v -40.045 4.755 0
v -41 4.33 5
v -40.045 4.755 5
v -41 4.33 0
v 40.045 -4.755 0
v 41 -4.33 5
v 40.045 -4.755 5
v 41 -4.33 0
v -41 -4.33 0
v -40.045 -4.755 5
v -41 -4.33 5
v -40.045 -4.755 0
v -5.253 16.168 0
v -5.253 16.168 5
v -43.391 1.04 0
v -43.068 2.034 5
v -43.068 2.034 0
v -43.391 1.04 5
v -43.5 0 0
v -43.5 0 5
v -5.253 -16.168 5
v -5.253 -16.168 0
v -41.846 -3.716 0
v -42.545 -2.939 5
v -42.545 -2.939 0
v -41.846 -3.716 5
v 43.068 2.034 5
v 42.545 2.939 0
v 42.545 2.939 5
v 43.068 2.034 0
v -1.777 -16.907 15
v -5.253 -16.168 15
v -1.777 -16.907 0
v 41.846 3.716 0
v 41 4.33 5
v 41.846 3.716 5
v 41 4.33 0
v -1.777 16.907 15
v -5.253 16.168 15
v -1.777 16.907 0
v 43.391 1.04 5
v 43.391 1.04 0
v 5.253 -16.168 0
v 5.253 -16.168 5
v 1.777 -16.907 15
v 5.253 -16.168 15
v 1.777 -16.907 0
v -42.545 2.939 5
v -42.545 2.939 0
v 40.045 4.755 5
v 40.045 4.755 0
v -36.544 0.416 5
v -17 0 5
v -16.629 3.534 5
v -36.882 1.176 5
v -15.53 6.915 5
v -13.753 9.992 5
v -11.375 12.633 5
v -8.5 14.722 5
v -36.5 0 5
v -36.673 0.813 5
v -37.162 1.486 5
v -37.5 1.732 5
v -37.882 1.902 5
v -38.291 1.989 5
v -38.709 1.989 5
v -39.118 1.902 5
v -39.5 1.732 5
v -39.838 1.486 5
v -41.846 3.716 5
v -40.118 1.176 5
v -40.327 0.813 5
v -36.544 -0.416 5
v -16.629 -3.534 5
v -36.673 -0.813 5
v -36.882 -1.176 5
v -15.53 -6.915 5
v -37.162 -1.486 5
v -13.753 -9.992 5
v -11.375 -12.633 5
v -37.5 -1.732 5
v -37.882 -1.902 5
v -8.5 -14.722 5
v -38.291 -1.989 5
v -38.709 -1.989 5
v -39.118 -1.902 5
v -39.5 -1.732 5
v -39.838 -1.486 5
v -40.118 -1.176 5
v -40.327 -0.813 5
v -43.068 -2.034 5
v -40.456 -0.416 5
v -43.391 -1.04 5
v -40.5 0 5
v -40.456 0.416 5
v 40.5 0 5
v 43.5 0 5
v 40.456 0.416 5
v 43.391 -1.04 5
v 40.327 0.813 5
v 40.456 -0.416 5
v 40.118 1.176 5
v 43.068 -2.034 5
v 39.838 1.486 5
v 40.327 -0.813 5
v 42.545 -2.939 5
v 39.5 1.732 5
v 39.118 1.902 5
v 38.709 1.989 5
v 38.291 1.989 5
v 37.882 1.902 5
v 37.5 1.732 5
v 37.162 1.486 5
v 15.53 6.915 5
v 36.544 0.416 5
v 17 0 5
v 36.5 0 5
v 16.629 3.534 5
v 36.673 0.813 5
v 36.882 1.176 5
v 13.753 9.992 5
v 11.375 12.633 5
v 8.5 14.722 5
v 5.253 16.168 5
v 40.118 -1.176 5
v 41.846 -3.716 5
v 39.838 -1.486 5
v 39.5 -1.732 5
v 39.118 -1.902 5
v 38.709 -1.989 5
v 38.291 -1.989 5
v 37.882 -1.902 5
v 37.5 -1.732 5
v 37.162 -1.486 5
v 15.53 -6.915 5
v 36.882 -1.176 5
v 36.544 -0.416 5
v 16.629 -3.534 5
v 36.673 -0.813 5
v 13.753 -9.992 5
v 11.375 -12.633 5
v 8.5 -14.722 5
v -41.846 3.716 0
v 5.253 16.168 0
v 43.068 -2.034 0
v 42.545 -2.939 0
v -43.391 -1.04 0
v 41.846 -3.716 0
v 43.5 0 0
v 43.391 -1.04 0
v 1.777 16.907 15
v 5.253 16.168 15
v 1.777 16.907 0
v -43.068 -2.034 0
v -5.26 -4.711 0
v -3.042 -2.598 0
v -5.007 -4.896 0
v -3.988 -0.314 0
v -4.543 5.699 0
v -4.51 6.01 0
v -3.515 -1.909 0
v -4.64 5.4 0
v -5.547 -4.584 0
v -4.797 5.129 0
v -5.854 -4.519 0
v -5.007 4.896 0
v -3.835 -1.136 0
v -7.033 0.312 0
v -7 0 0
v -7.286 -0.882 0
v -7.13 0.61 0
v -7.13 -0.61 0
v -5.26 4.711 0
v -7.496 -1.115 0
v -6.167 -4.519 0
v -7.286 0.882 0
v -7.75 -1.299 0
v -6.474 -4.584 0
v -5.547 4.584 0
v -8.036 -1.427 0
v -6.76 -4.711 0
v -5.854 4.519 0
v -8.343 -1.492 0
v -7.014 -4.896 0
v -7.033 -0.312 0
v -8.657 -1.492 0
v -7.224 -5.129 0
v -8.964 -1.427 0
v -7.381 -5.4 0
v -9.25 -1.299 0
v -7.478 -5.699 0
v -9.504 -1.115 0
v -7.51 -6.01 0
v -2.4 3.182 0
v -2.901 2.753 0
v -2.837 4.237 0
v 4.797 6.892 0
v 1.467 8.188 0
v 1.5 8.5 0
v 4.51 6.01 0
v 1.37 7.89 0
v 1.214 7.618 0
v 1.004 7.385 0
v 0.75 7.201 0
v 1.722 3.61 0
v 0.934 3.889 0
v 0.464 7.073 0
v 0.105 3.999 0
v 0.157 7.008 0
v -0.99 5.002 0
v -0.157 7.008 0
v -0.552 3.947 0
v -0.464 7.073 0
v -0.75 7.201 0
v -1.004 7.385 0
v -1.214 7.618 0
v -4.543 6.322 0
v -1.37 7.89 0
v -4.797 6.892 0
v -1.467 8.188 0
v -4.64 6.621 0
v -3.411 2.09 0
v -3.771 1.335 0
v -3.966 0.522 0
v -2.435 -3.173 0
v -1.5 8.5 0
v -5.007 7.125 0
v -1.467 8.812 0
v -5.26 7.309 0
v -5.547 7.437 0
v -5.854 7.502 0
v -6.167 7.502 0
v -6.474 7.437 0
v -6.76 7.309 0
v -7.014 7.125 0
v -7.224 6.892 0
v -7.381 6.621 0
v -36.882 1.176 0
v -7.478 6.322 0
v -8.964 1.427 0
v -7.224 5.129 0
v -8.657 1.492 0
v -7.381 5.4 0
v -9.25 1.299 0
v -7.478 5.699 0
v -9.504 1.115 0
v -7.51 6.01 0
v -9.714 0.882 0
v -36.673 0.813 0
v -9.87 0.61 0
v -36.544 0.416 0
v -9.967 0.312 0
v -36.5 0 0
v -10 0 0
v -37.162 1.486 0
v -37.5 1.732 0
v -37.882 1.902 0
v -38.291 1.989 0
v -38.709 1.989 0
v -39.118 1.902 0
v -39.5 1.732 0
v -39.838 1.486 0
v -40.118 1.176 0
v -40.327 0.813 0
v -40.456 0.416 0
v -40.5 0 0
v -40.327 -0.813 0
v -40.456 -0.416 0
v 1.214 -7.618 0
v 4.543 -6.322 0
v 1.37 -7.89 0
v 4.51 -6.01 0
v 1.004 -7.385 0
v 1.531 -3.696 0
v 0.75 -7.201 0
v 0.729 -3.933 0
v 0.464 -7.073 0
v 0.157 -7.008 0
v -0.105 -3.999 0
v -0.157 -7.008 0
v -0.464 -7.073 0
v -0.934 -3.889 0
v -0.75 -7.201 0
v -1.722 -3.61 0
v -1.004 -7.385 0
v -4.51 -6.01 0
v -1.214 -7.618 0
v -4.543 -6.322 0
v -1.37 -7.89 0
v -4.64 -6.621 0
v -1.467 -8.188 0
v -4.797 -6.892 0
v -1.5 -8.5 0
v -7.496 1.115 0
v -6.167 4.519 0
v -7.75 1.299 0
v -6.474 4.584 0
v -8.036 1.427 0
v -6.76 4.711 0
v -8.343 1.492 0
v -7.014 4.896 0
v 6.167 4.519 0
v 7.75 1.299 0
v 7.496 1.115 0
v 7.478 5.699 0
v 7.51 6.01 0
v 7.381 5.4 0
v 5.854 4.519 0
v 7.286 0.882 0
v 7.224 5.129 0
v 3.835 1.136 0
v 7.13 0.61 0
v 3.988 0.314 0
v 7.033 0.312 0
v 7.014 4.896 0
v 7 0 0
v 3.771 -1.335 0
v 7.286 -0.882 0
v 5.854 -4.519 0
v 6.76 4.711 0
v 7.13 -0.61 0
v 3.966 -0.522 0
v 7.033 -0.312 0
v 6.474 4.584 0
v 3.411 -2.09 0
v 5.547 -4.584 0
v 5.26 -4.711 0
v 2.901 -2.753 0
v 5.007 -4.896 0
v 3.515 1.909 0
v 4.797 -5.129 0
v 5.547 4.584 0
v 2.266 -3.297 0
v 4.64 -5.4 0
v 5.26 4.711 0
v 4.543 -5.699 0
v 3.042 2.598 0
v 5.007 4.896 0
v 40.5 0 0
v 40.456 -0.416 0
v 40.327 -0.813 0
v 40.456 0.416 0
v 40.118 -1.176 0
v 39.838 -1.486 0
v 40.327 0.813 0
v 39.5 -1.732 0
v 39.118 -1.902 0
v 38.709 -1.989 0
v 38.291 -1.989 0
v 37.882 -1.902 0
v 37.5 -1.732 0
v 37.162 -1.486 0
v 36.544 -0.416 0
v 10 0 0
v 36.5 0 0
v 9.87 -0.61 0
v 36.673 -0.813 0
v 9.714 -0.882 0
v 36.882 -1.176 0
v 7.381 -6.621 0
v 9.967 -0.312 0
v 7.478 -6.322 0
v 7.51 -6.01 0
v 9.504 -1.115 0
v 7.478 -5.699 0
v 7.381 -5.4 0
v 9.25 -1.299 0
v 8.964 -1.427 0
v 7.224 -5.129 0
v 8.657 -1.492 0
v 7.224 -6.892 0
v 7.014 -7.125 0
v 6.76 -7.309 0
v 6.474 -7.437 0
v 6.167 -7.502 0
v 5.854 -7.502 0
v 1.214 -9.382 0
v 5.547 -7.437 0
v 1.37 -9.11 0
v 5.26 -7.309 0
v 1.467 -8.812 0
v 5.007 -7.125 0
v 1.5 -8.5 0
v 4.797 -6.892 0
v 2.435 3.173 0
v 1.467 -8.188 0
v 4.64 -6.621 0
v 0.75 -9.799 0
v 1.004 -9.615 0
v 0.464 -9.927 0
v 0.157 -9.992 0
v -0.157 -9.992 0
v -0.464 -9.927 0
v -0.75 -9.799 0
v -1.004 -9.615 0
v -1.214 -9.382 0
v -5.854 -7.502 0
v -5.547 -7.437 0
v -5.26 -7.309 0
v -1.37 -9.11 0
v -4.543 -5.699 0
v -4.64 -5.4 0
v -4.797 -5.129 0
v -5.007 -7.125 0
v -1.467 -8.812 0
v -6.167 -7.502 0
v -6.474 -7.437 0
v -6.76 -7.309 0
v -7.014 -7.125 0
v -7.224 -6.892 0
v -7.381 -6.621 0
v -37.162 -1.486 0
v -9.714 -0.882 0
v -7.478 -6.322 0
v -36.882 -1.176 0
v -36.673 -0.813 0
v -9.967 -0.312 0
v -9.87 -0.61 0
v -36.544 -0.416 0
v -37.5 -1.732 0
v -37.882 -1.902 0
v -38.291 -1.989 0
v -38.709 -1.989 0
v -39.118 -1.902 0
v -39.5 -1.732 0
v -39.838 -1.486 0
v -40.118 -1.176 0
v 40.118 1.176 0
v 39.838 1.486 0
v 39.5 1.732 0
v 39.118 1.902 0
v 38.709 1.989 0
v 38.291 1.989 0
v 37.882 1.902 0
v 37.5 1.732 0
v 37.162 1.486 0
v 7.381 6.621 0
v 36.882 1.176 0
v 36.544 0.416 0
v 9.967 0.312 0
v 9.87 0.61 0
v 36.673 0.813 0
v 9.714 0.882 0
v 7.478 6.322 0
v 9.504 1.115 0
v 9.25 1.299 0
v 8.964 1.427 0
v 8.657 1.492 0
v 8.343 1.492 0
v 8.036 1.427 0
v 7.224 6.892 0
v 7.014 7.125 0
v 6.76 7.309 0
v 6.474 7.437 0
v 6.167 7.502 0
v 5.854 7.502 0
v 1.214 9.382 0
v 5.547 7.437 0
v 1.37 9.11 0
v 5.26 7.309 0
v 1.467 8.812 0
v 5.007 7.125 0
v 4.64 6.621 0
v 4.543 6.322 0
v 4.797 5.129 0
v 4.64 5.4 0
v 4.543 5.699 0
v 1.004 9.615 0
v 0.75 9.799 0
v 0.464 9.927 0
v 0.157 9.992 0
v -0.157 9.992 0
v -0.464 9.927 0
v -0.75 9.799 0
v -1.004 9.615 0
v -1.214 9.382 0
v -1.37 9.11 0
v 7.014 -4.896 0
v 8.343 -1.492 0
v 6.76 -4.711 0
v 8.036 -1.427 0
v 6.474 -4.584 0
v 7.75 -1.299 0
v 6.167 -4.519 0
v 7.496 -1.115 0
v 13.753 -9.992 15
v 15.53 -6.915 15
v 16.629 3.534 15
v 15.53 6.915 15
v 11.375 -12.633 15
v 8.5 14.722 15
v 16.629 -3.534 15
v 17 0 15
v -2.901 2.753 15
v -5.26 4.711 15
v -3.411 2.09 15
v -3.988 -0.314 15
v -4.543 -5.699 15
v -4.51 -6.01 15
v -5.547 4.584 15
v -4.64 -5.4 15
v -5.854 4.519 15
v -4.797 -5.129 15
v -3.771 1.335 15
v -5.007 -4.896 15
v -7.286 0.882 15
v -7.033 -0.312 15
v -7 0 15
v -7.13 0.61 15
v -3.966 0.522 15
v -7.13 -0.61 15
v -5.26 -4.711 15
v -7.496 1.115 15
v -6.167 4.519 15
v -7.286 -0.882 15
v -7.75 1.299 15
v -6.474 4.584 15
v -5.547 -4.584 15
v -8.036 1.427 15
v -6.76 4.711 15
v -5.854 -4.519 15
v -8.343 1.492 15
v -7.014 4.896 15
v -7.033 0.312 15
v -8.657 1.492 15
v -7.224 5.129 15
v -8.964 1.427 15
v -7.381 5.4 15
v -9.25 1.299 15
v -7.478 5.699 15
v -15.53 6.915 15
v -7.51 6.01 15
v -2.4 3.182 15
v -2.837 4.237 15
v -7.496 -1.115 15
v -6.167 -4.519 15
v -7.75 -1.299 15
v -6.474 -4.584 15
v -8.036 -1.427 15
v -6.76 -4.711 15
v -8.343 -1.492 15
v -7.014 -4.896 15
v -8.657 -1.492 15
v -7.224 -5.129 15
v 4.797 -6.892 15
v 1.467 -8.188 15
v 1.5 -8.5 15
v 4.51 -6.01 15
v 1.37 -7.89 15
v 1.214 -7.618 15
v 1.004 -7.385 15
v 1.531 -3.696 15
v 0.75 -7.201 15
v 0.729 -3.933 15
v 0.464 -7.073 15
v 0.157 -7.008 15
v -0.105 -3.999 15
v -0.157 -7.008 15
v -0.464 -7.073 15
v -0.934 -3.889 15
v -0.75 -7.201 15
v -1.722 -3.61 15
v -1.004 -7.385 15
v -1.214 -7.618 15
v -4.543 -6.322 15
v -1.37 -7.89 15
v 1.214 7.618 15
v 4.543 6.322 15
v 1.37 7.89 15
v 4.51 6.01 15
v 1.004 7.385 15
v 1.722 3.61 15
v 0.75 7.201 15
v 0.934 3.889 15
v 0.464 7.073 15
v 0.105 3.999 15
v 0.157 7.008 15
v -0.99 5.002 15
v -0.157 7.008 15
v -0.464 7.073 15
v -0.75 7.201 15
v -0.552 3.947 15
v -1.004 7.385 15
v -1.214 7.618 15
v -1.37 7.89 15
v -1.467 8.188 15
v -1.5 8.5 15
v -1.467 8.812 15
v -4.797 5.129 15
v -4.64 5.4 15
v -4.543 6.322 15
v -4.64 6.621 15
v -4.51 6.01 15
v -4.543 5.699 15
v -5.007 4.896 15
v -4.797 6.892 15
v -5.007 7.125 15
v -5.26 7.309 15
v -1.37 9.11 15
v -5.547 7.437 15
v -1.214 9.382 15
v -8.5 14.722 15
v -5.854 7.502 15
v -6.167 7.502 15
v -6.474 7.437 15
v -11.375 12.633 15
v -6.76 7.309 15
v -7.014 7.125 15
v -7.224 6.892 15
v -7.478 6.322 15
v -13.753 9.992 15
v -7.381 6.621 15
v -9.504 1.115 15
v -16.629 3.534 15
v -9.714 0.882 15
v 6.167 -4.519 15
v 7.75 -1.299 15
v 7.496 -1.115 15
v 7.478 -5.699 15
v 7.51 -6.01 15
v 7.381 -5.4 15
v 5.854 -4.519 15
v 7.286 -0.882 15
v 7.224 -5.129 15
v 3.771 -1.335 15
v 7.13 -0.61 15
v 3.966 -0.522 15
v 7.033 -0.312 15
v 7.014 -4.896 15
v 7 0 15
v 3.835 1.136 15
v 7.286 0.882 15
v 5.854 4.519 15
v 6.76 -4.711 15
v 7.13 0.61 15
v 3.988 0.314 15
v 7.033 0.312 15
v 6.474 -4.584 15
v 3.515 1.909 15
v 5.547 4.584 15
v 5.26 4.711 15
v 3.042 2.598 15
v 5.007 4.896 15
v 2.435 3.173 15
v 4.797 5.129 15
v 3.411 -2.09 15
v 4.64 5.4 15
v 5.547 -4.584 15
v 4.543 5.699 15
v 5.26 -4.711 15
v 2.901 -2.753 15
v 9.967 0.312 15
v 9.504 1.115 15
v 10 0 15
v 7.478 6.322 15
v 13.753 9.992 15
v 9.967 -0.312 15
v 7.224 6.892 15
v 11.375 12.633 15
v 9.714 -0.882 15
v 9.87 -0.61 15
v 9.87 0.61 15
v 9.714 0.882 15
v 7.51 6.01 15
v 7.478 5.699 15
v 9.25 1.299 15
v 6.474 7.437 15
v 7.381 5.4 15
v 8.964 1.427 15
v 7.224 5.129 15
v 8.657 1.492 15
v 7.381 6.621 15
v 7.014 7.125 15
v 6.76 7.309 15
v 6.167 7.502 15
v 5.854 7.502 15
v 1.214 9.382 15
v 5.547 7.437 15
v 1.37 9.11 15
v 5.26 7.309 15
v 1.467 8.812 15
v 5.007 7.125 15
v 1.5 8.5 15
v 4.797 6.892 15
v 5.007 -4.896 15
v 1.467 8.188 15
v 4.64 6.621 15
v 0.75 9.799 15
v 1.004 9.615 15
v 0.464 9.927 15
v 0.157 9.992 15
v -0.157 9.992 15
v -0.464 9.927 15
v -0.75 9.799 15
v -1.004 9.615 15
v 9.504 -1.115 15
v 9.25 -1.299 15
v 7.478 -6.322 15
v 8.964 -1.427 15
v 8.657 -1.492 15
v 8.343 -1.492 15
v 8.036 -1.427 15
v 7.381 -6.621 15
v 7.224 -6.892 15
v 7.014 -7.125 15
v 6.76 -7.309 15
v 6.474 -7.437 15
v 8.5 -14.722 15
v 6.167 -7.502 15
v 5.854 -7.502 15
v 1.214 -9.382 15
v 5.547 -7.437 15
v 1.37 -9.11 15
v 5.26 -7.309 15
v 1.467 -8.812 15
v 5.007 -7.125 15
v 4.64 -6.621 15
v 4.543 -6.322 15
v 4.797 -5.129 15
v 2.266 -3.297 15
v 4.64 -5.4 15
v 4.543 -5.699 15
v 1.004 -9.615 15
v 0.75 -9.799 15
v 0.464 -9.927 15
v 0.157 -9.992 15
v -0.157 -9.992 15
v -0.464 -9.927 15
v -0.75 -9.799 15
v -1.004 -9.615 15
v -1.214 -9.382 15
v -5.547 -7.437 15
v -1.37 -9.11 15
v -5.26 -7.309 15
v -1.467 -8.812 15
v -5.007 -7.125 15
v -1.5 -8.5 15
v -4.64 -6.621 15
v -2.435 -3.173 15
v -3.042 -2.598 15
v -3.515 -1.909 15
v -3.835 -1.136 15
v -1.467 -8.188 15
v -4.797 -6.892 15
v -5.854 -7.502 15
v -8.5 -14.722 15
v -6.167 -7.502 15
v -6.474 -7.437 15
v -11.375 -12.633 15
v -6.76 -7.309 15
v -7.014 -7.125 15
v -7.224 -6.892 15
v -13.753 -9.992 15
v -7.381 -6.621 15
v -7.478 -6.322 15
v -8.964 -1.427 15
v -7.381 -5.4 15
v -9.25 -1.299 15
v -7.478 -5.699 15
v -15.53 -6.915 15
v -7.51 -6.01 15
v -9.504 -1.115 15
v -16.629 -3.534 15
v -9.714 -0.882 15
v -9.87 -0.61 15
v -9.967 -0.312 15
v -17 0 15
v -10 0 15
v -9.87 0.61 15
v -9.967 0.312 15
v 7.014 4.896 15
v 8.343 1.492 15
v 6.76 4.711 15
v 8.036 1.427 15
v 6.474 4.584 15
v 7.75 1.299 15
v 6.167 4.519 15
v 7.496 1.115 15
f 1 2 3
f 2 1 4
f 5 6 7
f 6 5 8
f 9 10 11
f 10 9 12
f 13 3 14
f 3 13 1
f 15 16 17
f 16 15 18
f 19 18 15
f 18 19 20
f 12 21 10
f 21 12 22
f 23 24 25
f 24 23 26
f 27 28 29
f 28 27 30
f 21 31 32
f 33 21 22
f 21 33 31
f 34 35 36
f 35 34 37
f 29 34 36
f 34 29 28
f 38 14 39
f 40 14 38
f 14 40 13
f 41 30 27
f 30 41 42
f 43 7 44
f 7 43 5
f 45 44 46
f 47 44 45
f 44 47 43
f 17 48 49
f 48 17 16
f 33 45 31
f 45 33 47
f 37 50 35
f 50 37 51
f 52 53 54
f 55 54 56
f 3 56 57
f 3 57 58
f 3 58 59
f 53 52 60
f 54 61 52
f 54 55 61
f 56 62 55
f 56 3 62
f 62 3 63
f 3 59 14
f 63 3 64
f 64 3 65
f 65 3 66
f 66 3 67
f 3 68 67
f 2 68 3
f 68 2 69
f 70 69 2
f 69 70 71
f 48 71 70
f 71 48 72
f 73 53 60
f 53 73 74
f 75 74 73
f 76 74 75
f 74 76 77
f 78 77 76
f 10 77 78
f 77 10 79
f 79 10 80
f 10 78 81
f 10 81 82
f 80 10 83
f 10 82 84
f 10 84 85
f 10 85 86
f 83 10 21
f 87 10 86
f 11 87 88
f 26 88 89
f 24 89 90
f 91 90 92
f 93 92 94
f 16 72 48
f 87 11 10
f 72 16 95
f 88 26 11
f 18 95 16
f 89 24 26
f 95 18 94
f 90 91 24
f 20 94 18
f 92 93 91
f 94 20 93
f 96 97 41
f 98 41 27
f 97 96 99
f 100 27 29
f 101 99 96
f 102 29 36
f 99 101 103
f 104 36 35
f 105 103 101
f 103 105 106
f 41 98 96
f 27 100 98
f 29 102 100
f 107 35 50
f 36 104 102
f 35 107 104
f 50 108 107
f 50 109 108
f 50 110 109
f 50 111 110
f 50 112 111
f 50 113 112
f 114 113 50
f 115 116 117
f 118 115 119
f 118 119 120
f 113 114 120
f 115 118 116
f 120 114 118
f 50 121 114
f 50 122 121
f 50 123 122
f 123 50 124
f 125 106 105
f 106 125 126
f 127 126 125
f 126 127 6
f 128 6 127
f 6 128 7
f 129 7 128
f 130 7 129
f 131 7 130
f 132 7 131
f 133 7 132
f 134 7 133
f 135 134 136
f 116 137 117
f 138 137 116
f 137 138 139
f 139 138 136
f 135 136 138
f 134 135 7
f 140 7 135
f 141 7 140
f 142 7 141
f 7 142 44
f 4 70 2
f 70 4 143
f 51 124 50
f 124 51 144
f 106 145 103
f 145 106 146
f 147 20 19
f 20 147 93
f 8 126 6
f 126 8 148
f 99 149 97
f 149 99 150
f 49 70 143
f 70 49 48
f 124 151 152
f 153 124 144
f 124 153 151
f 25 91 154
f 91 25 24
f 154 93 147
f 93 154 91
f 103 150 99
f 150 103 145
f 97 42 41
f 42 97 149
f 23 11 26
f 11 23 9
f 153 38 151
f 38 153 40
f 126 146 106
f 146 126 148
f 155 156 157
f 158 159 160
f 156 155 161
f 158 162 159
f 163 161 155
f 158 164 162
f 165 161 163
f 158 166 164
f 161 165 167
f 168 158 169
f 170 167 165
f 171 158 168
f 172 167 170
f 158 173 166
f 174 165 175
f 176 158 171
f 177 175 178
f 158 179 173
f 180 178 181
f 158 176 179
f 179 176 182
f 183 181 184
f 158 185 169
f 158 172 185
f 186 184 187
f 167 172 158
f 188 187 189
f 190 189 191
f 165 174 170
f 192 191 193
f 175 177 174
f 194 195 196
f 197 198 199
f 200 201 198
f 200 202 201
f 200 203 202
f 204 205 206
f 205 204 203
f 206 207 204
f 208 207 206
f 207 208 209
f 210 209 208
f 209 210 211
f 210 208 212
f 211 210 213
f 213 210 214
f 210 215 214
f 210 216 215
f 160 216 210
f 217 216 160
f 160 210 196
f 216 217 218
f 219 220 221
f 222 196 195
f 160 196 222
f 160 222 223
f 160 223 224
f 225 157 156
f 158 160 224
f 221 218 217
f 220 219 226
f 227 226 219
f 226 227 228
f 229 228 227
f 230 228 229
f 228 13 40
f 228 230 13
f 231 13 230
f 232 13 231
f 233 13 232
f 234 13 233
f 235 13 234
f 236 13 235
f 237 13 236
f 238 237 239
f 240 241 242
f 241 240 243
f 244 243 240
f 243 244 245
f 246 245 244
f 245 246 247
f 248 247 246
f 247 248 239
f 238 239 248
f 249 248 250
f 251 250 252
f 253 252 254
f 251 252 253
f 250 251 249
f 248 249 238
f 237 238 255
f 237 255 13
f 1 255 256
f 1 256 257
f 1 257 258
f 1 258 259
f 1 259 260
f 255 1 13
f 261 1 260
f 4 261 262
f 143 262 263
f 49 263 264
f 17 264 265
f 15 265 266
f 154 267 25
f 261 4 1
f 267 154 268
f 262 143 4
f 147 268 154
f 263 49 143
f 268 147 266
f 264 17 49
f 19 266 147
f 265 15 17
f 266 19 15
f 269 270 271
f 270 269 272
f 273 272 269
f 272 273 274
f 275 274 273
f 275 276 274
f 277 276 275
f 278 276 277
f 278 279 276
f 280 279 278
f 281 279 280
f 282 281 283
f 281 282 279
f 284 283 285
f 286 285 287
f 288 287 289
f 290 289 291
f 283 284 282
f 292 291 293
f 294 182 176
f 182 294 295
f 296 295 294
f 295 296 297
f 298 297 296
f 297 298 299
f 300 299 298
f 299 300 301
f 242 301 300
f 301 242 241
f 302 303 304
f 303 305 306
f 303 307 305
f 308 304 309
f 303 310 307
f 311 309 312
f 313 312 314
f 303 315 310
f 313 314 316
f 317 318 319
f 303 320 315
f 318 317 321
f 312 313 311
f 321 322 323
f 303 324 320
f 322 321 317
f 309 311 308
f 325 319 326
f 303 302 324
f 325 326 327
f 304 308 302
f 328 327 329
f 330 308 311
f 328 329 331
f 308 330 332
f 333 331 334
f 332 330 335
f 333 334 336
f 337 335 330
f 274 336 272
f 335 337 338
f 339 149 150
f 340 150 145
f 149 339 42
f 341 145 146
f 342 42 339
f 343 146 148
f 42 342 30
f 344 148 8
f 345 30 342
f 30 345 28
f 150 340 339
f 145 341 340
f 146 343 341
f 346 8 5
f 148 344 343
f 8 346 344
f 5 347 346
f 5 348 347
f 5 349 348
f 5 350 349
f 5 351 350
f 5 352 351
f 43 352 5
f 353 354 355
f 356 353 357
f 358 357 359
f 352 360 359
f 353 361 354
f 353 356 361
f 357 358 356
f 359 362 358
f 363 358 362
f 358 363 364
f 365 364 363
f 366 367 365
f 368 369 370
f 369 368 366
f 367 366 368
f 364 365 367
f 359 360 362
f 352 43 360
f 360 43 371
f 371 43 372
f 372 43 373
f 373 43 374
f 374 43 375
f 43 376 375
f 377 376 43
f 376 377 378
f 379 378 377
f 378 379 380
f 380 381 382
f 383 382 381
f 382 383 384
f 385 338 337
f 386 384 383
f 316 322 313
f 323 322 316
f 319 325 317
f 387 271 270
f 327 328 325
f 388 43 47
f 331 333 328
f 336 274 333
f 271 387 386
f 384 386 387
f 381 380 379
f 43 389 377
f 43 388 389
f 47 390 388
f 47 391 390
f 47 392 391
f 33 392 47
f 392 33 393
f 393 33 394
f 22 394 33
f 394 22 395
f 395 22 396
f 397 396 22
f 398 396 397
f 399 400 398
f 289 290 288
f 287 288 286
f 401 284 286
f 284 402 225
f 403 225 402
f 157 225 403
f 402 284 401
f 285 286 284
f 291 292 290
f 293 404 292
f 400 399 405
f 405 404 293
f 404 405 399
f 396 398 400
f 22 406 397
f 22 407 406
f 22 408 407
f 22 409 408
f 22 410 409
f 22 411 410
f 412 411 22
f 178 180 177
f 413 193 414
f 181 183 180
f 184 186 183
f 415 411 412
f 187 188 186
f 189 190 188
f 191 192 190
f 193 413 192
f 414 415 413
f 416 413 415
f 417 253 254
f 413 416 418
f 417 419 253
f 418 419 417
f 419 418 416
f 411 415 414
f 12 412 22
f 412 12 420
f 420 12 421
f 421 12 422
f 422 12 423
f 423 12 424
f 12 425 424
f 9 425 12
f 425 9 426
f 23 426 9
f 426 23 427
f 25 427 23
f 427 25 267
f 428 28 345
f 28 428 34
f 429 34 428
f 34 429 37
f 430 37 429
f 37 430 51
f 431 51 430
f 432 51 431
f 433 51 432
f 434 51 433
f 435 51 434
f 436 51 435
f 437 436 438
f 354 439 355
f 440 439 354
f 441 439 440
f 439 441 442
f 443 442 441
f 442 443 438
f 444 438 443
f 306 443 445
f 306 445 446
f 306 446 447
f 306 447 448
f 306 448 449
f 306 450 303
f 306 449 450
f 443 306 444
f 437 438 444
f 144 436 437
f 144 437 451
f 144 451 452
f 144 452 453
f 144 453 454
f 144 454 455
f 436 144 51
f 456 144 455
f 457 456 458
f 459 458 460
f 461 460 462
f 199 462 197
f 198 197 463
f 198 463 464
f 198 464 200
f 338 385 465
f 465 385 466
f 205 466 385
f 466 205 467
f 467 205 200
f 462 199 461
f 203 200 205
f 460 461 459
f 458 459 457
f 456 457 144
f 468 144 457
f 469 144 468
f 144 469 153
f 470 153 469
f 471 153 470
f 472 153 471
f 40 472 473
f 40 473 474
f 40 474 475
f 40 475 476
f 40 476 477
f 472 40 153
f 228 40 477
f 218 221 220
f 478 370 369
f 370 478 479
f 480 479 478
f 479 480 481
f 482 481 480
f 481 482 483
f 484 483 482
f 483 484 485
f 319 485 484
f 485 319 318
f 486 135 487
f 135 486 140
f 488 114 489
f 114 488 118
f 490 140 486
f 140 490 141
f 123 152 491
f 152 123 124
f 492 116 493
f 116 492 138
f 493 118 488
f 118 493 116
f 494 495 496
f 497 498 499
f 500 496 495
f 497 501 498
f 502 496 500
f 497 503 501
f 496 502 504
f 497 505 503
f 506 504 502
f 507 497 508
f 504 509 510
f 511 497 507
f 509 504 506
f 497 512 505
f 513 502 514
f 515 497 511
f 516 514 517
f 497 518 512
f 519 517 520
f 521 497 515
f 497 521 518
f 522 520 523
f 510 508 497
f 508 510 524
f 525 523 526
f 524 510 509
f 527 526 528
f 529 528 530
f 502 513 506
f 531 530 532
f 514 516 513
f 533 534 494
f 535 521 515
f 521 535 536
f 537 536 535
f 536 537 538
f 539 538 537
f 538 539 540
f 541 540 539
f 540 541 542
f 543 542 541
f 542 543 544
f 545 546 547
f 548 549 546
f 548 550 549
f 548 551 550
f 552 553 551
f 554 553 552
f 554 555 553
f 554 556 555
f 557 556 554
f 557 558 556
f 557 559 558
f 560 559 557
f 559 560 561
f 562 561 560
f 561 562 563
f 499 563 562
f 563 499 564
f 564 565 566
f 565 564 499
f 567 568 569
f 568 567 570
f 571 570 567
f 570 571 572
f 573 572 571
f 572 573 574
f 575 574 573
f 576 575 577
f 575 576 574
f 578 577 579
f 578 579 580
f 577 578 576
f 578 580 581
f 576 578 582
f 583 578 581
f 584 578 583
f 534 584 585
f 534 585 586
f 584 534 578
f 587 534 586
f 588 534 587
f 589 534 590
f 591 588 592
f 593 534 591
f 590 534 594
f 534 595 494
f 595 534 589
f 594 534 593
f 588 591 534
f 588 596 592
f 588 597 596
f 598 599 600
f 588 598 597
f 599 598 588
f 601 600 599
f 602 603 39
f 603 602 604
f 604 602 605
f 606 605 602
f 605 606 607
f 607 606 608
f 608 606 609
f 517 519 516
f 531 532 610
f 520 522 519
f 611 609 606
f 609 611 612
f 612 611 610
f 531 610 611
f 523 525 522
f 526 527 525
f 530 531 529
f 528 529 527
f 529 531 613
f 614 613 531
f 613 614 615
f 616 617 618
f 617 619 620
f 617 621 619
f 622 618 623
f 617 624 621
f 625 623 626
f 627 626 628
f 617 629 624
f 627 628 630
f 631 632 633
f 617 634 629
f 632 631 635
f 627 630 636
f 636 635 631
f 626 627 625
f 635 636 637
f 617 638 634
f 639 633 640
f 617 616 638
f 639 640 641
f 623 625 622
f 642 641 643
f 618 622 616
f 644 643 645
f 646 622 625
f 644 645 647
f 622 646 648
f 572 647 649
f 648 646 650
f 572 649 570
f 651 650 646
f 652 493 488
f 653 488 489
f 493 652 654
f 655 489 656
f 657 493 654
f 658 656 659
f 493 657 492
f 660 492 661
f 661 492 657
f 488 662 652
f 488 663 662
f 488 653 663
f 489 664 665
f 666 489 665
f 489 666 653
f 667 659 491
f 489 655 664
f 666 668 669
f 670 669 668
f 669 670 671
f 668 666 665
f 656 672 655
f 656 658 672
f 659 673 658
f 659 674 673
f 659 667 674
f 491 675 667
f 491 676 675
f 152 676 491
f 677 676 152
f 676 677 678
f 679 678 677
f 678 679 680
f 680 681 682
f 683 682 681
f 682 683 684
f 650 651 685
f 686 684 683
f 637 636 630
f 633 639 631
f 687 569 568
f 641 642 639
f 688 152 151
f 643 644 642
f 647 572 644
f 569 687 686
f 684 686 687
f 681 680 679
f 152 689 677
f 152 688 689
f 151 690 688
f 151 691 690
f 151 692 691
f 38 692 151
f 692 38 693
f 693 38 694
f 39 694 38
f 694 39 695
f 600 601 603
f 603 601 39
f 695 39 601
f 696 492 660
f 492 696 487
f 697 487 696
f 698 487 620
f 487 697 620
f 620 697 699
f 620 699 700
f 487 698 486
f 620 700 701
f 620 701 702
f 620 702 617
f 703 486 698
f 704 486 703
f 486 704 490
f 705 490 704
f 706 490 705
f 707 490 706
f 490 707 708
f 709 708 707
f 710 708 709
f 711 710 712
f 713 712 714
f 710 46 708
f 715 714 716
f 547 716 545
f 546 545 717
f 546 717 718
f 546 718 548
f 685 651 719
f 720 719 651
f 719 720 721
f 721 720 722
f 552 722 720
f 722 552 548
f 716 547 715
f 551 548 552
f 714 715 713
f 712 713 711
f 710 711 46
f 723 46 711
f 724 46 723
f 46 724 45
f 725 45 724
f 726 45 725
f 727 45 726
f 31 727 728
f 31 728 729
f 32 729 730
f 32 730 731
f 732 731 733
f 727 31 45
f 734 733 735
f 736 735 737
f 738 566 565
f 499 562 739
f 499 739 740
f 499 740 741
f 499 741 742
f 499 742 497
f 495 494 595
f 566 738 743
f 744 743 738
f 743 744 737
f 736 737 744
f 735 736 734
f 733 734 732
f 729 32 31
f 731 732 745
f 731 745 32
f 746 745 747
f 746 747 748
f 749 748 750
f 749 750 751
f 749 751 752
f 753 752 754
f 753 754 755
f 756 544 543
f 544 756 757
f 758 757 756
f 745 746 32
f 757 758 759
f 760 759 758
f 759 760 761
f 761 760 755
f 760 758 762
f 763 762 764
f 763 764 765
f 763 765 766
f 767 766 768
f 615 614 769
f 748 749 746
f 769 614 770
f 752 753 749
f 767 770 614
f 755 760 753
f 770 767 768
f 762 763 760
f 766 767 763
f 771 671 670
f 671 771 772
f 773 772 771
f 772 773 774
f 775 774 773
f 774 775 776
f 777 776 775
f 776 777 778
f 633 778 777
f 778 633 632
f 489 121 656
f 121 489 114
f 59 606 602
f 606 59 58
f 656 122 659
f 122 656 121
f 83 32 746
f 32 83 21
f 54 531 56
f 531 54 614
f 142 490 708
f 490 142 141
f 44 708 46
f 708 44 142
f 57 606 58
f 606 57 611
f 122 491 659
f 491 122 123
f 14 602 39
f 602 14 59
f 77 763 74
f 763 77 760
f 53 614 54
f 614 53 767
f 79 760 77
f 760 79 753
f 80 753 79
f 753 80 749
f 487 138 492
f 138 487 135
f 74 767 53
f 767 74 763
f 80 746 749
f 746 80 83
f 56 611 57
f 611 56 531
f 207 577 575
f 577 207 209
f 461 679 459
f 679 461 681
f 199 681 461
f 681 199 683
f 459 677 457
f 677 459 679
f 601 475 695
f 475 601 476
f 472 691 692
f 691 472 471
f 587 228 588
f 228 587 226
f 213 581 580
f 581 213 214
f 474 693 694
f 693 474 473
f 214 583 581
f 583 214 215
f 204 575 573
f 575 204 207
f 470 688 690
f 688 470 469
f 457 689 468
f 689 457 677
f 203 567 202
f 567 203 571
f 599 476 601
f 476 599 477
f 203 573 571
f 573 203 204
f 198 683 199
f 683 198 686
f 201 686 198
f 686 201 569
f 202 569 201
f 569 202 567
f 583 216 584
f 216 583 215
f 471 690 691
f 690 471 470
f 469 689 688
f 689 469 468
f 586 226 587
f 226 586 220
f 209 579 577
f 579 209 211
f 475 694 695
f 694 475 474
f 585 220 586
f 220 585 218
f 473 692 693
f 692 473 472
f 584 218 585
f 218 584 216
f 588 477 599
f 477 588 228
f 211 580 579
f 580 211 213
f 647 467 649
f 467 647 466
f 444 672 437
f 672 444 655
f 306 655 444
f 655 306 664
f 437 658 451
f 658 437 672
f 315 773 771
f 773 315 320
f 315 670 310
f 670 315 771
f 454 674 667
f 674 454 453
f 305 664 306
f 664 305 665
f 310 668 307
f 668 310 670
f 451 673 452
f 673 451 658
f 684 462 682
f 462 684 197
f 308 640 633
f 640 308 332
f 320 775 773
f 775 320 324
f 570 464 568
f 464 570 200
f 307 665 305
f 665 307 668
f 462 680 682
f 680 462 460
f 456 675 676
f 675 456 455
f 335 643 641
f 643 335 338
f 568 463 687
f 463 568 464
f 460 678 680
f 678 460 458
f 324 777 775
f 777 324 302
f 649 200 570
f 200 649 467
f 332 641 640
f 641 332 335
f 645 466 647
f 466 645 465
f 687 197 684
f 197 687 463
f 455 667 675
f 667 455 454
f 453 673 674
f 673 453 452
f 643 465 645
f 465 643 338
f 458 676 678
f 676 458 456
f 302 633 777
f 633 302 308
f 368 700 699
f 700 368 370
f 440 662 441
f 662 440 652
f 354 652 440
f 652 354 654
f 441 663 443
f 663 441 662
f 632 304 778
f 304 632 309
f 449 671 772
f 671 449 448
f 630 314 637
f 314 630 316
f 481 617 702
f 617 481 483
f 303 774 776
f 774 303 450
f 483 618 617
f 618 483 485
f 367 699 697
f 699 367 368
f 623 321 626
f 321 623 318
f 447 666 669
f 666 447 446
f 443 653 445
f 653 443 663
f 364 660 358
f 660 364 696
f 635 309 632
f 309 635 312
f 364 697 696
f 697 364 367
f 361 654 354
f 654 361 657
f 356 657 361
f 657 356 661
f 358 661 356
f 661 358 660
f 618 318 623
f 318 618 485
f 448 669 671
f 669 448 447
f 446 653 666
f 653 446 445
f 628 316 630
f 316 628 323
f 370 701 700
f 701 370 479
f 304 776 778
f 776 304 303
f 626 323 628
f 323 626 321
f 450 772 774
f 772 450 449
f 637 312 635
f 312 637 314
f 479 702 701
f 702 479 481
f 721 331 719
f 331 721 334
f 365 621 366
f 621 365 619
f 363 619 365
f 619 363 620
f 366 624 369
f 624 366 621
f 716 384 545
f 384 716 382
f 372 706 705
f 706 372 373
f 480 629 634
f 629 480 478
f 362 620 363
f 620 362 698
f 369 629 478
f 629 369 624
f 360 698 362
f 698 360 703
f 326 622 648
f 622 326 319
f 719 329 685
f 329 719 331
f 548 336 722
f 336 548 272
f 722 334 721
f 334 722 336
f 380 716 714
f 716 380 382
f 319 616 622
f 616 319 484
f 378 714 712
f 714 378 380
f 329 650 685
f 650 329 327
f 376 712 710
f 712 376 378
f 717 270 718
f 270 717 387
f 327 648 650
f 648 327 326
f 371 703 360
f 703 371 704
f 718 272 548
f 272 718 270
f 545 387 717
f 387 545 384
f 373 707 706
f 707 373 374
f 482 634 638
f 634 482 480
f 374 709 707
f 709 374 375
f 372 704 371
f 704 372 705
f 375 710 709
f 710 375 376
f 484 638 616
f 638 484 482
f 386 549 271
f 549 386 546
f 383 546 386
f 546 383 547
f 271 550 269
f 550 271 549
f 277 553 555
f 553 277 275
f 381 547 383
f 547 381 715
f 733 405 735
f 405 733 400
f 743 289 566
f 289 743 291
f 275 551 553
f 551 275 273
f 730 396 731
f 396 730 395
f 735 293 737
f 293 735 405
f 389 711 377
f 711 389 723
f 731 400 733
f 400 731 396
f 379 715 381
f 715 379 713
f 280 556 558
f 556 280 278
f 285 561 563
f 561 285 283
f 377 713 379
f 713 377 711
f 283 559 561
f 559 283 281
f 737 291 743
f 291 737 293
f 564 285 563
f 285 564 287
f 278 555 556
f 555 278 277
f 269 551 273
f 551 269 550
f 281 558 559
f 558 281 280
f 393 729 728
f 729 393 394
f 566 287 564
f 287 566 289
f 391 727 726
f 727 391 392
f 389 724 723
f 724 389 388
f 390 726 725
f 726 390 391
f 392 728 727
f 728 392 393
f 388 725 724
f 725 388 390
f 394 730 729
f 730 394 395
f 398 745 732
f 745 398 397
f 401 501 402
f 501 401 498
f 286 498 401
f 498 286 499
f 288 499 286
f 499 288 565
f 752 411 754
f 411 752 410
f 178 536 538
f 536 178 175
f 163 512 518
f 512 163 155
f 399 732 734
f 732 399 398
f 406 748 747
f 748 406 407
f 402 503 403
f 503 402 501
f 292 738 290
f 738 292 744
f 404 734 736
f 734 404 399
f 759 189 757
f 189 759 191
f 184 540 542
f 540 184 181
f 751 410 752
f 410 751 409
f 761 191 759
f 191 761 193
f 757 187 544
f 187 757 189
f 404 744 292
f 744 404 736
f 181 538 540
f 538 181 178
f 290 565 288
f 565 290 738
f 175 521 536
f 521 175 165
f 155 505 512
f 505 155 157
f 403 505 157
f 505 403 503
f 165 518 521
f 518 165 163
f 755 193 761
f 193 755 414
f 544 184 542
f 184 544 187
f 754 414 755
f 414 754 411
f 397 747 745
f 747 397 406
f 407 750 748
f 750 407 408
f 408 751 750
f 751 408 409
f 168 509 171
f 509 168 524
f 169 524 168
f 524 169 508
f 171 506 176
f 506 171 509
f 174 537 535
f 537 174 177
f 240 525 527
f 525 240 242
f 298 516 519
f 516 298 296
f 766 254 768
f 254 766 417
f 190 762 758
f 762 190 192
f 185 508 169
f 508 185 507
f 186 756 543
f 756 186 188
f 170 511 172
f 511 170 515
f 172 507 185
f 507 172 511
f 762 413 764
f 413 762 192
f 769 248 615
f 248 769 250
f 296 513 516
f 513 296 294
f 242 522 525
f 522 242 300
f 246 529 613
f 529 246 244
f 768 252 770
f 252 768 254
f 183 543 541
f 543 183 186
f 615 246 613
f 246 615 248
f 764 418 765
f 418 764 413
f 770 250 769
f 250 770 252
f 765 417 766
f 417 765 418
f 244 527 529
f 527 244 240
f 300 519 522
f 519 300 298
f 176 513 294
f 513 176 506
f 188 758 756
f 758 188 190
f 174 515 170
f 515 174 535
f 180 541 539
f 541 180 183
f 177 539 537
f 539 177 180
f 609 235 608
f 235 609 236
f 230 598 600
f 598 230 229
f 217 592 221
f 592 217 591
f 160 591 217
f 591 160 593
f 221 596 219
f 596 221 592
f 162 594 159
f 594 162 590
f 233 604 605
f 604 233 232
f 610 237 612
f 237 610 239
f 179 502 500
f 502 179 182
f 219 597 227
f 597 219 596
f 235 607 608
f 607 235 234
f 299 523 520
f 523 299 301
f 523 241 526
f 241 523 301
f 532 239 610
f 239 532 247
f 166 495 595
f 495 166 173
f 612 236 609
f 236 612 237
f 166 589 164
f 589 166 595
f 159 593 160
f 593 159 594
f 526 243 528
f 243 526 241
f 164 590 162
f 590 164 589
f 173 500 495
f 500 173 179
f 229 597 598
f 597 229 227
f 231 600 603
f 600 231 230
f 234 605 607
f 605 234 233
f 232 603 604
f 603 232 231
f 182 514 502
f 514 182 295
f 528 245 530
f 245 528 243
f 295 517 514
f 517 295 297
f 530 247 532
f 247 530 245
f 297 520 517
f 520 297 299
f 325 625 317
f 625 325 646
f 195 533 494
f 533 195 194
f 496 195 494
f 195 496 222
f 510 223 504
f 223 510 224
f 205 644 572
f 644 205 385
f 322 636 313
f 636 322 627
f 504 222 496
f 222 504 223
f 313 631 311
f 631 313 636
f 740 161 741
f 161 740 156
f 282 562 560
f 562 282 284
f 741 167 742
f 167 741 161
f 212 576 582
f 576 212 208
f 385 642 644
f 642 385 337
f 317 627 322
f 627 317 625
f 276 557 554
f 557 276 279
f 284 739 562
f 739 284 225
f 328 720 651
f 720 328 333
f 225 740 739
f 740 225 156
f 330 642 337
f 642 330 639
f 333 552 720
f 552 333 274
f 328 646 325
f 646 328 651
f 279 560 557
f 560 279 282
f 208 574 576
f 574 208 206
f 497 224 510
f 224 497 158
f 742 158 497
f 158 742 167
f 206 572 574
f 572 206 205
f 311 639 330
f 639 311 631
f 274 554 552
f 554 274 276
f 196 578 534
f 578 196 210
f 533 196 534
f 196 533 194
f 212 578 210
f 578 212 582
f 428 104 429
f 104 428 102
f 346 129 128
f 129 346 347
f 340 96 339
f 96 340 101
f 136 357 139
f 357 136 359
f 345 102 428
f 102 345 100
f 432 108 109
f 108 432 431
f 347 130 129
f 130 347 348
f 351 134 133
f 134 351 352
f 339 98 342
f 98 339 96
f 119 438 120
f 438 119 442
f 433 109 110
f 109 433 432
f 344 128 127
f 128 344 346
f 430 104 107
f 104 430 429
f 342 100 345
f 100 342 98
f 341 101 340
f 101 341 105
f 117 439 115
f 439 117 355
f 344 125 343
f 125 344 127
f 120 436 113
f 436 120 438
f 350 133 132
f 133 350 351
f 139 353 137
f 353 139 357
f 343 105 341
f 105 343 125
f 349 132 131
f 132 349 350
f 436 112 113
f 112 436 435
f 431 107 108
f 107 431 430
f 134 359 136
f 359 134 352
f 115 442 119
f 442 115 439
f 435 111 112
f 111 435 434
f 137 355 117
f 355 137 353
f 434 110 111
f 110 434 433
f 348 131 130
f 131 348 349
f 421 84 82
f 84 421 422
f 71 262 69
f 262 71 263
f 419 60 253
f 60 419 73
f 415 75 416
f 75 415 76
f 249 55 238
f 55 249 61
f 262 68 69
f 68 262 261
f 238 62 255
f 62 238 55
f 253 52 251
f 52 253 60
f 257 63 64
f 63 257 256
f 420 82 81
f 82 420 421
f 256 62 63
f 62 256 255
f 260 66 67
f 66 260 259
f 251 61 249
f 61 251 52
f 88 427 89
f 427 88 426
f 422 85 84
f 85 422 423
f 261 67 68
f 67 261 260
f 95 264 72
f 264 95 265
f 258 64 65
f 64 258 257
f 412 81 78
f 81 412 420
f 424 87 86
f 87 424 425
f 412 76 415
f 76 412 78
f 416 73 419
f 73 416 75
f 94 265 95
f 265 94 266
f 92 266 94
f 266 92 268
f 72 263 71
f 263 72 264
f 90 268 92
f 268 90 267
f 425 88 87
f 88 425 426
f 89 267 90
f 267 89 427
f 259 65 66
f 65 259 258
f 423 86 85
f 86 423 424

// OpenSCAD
// [FL_INDEX: keywords="openscad, 3d_parametric, Customizable_Tube_Socket, csg_solid" | COT="Parametric OpenSCAD design from 3DCodeverse"]
// Title: Customizable Tube Socket

/*
Create a tube socket for 3D printing
By: Dave Borghuis / zeno4ever
Version : 1.2
Date : 22-01-2012
For sugestions email me at : zeno4ever@gmail.com

22-01-12 Added Notch option/parameters
18-01-12 Initial version
30-01-12 Make script better for use in Customizer (by Makerbot)

Usage : at least change the Socket dimensions and pin size. The rest of the 
parameter can be changed to, this defaults should be reasonable.

All $r is radius, you can enter diameter/2 

Current parameters are for a octal base tube socket
*/

//All sizes in mm
socket_hight = 15 ;
socket_radius = 17;

pin_radius = 1.5;

//How many holes
pin_numbers = 8; //[1:32]

//Distance from center
pin_distance = 8.5 ; 

//Enable center hole, 0 to disable hole & notch
center_radius = 4; 
//0 to disable
notch_size = 2;
notch_position =  112.5; //[1:360]
notch_distance = center_radius;

//Resolution of model
$fs = 0.01*1; 

// Create Tube Socet 
difference() {
	//Create footer
	union() {
		hull() {
	  		translate([77/2,0,0]) cylinder(5,10/2,10/2);
      		translate([0,0,0]) cylinder(5,socket_radius,socket_radius);
	  		translate([-77/2,0,0]) cylinder(5,10/2,10/2);	
		}
		translate([0,0,5]) cylinder(socket_hight-5 , socket_radius, socket_radius);
	}
	//Create all holes
	for (i = [0:pin_numbers-1]) { //create holes
		//echo(360*i/6, sin(360*i/6)*80, cos(360*i/6)*80);
		translate([sin(360*i/pin_numbers)*pin_distance, cos(360*i/pin_numbers)*pin_distance, 0 ])
		cylinder(socket_hight*2, pin_radius,pin_radius); 
	}

	//Exaple if you want to put a pin at some 'random' position
	//replace the 90 in next line for the position
	//translate([sin(90)*pin_distance, cos(90)*pin_distance, 0 ]) cylinder(socket_hight, pin_radius,pin_radius); 
	
	//Create center hole/notch
	if (center_radius>0) { //if centerhole 
		if (notch_size!=0) //and notch {
			rotate(a=[0,0,notch_position])
			union() {
				cylinder(socket_hight*2,center_radius,center_radius); //Center pin
				translate([notch_distance,0, 0 ]) cube(size=[notch_size,notch_size,socket_hight*2], center=true); //Notch
				} 
		} else {
			cylinder(socket_hight*2,center_radius,center_radius); //Only center pin
	}


	//holes in the footer
	translate([77/2,0,0]) cylinder(socket_hight*2,2,2); 
	translate([-77/2,0,0]) cylinder(socket_hight*2,2,2); 	
}
